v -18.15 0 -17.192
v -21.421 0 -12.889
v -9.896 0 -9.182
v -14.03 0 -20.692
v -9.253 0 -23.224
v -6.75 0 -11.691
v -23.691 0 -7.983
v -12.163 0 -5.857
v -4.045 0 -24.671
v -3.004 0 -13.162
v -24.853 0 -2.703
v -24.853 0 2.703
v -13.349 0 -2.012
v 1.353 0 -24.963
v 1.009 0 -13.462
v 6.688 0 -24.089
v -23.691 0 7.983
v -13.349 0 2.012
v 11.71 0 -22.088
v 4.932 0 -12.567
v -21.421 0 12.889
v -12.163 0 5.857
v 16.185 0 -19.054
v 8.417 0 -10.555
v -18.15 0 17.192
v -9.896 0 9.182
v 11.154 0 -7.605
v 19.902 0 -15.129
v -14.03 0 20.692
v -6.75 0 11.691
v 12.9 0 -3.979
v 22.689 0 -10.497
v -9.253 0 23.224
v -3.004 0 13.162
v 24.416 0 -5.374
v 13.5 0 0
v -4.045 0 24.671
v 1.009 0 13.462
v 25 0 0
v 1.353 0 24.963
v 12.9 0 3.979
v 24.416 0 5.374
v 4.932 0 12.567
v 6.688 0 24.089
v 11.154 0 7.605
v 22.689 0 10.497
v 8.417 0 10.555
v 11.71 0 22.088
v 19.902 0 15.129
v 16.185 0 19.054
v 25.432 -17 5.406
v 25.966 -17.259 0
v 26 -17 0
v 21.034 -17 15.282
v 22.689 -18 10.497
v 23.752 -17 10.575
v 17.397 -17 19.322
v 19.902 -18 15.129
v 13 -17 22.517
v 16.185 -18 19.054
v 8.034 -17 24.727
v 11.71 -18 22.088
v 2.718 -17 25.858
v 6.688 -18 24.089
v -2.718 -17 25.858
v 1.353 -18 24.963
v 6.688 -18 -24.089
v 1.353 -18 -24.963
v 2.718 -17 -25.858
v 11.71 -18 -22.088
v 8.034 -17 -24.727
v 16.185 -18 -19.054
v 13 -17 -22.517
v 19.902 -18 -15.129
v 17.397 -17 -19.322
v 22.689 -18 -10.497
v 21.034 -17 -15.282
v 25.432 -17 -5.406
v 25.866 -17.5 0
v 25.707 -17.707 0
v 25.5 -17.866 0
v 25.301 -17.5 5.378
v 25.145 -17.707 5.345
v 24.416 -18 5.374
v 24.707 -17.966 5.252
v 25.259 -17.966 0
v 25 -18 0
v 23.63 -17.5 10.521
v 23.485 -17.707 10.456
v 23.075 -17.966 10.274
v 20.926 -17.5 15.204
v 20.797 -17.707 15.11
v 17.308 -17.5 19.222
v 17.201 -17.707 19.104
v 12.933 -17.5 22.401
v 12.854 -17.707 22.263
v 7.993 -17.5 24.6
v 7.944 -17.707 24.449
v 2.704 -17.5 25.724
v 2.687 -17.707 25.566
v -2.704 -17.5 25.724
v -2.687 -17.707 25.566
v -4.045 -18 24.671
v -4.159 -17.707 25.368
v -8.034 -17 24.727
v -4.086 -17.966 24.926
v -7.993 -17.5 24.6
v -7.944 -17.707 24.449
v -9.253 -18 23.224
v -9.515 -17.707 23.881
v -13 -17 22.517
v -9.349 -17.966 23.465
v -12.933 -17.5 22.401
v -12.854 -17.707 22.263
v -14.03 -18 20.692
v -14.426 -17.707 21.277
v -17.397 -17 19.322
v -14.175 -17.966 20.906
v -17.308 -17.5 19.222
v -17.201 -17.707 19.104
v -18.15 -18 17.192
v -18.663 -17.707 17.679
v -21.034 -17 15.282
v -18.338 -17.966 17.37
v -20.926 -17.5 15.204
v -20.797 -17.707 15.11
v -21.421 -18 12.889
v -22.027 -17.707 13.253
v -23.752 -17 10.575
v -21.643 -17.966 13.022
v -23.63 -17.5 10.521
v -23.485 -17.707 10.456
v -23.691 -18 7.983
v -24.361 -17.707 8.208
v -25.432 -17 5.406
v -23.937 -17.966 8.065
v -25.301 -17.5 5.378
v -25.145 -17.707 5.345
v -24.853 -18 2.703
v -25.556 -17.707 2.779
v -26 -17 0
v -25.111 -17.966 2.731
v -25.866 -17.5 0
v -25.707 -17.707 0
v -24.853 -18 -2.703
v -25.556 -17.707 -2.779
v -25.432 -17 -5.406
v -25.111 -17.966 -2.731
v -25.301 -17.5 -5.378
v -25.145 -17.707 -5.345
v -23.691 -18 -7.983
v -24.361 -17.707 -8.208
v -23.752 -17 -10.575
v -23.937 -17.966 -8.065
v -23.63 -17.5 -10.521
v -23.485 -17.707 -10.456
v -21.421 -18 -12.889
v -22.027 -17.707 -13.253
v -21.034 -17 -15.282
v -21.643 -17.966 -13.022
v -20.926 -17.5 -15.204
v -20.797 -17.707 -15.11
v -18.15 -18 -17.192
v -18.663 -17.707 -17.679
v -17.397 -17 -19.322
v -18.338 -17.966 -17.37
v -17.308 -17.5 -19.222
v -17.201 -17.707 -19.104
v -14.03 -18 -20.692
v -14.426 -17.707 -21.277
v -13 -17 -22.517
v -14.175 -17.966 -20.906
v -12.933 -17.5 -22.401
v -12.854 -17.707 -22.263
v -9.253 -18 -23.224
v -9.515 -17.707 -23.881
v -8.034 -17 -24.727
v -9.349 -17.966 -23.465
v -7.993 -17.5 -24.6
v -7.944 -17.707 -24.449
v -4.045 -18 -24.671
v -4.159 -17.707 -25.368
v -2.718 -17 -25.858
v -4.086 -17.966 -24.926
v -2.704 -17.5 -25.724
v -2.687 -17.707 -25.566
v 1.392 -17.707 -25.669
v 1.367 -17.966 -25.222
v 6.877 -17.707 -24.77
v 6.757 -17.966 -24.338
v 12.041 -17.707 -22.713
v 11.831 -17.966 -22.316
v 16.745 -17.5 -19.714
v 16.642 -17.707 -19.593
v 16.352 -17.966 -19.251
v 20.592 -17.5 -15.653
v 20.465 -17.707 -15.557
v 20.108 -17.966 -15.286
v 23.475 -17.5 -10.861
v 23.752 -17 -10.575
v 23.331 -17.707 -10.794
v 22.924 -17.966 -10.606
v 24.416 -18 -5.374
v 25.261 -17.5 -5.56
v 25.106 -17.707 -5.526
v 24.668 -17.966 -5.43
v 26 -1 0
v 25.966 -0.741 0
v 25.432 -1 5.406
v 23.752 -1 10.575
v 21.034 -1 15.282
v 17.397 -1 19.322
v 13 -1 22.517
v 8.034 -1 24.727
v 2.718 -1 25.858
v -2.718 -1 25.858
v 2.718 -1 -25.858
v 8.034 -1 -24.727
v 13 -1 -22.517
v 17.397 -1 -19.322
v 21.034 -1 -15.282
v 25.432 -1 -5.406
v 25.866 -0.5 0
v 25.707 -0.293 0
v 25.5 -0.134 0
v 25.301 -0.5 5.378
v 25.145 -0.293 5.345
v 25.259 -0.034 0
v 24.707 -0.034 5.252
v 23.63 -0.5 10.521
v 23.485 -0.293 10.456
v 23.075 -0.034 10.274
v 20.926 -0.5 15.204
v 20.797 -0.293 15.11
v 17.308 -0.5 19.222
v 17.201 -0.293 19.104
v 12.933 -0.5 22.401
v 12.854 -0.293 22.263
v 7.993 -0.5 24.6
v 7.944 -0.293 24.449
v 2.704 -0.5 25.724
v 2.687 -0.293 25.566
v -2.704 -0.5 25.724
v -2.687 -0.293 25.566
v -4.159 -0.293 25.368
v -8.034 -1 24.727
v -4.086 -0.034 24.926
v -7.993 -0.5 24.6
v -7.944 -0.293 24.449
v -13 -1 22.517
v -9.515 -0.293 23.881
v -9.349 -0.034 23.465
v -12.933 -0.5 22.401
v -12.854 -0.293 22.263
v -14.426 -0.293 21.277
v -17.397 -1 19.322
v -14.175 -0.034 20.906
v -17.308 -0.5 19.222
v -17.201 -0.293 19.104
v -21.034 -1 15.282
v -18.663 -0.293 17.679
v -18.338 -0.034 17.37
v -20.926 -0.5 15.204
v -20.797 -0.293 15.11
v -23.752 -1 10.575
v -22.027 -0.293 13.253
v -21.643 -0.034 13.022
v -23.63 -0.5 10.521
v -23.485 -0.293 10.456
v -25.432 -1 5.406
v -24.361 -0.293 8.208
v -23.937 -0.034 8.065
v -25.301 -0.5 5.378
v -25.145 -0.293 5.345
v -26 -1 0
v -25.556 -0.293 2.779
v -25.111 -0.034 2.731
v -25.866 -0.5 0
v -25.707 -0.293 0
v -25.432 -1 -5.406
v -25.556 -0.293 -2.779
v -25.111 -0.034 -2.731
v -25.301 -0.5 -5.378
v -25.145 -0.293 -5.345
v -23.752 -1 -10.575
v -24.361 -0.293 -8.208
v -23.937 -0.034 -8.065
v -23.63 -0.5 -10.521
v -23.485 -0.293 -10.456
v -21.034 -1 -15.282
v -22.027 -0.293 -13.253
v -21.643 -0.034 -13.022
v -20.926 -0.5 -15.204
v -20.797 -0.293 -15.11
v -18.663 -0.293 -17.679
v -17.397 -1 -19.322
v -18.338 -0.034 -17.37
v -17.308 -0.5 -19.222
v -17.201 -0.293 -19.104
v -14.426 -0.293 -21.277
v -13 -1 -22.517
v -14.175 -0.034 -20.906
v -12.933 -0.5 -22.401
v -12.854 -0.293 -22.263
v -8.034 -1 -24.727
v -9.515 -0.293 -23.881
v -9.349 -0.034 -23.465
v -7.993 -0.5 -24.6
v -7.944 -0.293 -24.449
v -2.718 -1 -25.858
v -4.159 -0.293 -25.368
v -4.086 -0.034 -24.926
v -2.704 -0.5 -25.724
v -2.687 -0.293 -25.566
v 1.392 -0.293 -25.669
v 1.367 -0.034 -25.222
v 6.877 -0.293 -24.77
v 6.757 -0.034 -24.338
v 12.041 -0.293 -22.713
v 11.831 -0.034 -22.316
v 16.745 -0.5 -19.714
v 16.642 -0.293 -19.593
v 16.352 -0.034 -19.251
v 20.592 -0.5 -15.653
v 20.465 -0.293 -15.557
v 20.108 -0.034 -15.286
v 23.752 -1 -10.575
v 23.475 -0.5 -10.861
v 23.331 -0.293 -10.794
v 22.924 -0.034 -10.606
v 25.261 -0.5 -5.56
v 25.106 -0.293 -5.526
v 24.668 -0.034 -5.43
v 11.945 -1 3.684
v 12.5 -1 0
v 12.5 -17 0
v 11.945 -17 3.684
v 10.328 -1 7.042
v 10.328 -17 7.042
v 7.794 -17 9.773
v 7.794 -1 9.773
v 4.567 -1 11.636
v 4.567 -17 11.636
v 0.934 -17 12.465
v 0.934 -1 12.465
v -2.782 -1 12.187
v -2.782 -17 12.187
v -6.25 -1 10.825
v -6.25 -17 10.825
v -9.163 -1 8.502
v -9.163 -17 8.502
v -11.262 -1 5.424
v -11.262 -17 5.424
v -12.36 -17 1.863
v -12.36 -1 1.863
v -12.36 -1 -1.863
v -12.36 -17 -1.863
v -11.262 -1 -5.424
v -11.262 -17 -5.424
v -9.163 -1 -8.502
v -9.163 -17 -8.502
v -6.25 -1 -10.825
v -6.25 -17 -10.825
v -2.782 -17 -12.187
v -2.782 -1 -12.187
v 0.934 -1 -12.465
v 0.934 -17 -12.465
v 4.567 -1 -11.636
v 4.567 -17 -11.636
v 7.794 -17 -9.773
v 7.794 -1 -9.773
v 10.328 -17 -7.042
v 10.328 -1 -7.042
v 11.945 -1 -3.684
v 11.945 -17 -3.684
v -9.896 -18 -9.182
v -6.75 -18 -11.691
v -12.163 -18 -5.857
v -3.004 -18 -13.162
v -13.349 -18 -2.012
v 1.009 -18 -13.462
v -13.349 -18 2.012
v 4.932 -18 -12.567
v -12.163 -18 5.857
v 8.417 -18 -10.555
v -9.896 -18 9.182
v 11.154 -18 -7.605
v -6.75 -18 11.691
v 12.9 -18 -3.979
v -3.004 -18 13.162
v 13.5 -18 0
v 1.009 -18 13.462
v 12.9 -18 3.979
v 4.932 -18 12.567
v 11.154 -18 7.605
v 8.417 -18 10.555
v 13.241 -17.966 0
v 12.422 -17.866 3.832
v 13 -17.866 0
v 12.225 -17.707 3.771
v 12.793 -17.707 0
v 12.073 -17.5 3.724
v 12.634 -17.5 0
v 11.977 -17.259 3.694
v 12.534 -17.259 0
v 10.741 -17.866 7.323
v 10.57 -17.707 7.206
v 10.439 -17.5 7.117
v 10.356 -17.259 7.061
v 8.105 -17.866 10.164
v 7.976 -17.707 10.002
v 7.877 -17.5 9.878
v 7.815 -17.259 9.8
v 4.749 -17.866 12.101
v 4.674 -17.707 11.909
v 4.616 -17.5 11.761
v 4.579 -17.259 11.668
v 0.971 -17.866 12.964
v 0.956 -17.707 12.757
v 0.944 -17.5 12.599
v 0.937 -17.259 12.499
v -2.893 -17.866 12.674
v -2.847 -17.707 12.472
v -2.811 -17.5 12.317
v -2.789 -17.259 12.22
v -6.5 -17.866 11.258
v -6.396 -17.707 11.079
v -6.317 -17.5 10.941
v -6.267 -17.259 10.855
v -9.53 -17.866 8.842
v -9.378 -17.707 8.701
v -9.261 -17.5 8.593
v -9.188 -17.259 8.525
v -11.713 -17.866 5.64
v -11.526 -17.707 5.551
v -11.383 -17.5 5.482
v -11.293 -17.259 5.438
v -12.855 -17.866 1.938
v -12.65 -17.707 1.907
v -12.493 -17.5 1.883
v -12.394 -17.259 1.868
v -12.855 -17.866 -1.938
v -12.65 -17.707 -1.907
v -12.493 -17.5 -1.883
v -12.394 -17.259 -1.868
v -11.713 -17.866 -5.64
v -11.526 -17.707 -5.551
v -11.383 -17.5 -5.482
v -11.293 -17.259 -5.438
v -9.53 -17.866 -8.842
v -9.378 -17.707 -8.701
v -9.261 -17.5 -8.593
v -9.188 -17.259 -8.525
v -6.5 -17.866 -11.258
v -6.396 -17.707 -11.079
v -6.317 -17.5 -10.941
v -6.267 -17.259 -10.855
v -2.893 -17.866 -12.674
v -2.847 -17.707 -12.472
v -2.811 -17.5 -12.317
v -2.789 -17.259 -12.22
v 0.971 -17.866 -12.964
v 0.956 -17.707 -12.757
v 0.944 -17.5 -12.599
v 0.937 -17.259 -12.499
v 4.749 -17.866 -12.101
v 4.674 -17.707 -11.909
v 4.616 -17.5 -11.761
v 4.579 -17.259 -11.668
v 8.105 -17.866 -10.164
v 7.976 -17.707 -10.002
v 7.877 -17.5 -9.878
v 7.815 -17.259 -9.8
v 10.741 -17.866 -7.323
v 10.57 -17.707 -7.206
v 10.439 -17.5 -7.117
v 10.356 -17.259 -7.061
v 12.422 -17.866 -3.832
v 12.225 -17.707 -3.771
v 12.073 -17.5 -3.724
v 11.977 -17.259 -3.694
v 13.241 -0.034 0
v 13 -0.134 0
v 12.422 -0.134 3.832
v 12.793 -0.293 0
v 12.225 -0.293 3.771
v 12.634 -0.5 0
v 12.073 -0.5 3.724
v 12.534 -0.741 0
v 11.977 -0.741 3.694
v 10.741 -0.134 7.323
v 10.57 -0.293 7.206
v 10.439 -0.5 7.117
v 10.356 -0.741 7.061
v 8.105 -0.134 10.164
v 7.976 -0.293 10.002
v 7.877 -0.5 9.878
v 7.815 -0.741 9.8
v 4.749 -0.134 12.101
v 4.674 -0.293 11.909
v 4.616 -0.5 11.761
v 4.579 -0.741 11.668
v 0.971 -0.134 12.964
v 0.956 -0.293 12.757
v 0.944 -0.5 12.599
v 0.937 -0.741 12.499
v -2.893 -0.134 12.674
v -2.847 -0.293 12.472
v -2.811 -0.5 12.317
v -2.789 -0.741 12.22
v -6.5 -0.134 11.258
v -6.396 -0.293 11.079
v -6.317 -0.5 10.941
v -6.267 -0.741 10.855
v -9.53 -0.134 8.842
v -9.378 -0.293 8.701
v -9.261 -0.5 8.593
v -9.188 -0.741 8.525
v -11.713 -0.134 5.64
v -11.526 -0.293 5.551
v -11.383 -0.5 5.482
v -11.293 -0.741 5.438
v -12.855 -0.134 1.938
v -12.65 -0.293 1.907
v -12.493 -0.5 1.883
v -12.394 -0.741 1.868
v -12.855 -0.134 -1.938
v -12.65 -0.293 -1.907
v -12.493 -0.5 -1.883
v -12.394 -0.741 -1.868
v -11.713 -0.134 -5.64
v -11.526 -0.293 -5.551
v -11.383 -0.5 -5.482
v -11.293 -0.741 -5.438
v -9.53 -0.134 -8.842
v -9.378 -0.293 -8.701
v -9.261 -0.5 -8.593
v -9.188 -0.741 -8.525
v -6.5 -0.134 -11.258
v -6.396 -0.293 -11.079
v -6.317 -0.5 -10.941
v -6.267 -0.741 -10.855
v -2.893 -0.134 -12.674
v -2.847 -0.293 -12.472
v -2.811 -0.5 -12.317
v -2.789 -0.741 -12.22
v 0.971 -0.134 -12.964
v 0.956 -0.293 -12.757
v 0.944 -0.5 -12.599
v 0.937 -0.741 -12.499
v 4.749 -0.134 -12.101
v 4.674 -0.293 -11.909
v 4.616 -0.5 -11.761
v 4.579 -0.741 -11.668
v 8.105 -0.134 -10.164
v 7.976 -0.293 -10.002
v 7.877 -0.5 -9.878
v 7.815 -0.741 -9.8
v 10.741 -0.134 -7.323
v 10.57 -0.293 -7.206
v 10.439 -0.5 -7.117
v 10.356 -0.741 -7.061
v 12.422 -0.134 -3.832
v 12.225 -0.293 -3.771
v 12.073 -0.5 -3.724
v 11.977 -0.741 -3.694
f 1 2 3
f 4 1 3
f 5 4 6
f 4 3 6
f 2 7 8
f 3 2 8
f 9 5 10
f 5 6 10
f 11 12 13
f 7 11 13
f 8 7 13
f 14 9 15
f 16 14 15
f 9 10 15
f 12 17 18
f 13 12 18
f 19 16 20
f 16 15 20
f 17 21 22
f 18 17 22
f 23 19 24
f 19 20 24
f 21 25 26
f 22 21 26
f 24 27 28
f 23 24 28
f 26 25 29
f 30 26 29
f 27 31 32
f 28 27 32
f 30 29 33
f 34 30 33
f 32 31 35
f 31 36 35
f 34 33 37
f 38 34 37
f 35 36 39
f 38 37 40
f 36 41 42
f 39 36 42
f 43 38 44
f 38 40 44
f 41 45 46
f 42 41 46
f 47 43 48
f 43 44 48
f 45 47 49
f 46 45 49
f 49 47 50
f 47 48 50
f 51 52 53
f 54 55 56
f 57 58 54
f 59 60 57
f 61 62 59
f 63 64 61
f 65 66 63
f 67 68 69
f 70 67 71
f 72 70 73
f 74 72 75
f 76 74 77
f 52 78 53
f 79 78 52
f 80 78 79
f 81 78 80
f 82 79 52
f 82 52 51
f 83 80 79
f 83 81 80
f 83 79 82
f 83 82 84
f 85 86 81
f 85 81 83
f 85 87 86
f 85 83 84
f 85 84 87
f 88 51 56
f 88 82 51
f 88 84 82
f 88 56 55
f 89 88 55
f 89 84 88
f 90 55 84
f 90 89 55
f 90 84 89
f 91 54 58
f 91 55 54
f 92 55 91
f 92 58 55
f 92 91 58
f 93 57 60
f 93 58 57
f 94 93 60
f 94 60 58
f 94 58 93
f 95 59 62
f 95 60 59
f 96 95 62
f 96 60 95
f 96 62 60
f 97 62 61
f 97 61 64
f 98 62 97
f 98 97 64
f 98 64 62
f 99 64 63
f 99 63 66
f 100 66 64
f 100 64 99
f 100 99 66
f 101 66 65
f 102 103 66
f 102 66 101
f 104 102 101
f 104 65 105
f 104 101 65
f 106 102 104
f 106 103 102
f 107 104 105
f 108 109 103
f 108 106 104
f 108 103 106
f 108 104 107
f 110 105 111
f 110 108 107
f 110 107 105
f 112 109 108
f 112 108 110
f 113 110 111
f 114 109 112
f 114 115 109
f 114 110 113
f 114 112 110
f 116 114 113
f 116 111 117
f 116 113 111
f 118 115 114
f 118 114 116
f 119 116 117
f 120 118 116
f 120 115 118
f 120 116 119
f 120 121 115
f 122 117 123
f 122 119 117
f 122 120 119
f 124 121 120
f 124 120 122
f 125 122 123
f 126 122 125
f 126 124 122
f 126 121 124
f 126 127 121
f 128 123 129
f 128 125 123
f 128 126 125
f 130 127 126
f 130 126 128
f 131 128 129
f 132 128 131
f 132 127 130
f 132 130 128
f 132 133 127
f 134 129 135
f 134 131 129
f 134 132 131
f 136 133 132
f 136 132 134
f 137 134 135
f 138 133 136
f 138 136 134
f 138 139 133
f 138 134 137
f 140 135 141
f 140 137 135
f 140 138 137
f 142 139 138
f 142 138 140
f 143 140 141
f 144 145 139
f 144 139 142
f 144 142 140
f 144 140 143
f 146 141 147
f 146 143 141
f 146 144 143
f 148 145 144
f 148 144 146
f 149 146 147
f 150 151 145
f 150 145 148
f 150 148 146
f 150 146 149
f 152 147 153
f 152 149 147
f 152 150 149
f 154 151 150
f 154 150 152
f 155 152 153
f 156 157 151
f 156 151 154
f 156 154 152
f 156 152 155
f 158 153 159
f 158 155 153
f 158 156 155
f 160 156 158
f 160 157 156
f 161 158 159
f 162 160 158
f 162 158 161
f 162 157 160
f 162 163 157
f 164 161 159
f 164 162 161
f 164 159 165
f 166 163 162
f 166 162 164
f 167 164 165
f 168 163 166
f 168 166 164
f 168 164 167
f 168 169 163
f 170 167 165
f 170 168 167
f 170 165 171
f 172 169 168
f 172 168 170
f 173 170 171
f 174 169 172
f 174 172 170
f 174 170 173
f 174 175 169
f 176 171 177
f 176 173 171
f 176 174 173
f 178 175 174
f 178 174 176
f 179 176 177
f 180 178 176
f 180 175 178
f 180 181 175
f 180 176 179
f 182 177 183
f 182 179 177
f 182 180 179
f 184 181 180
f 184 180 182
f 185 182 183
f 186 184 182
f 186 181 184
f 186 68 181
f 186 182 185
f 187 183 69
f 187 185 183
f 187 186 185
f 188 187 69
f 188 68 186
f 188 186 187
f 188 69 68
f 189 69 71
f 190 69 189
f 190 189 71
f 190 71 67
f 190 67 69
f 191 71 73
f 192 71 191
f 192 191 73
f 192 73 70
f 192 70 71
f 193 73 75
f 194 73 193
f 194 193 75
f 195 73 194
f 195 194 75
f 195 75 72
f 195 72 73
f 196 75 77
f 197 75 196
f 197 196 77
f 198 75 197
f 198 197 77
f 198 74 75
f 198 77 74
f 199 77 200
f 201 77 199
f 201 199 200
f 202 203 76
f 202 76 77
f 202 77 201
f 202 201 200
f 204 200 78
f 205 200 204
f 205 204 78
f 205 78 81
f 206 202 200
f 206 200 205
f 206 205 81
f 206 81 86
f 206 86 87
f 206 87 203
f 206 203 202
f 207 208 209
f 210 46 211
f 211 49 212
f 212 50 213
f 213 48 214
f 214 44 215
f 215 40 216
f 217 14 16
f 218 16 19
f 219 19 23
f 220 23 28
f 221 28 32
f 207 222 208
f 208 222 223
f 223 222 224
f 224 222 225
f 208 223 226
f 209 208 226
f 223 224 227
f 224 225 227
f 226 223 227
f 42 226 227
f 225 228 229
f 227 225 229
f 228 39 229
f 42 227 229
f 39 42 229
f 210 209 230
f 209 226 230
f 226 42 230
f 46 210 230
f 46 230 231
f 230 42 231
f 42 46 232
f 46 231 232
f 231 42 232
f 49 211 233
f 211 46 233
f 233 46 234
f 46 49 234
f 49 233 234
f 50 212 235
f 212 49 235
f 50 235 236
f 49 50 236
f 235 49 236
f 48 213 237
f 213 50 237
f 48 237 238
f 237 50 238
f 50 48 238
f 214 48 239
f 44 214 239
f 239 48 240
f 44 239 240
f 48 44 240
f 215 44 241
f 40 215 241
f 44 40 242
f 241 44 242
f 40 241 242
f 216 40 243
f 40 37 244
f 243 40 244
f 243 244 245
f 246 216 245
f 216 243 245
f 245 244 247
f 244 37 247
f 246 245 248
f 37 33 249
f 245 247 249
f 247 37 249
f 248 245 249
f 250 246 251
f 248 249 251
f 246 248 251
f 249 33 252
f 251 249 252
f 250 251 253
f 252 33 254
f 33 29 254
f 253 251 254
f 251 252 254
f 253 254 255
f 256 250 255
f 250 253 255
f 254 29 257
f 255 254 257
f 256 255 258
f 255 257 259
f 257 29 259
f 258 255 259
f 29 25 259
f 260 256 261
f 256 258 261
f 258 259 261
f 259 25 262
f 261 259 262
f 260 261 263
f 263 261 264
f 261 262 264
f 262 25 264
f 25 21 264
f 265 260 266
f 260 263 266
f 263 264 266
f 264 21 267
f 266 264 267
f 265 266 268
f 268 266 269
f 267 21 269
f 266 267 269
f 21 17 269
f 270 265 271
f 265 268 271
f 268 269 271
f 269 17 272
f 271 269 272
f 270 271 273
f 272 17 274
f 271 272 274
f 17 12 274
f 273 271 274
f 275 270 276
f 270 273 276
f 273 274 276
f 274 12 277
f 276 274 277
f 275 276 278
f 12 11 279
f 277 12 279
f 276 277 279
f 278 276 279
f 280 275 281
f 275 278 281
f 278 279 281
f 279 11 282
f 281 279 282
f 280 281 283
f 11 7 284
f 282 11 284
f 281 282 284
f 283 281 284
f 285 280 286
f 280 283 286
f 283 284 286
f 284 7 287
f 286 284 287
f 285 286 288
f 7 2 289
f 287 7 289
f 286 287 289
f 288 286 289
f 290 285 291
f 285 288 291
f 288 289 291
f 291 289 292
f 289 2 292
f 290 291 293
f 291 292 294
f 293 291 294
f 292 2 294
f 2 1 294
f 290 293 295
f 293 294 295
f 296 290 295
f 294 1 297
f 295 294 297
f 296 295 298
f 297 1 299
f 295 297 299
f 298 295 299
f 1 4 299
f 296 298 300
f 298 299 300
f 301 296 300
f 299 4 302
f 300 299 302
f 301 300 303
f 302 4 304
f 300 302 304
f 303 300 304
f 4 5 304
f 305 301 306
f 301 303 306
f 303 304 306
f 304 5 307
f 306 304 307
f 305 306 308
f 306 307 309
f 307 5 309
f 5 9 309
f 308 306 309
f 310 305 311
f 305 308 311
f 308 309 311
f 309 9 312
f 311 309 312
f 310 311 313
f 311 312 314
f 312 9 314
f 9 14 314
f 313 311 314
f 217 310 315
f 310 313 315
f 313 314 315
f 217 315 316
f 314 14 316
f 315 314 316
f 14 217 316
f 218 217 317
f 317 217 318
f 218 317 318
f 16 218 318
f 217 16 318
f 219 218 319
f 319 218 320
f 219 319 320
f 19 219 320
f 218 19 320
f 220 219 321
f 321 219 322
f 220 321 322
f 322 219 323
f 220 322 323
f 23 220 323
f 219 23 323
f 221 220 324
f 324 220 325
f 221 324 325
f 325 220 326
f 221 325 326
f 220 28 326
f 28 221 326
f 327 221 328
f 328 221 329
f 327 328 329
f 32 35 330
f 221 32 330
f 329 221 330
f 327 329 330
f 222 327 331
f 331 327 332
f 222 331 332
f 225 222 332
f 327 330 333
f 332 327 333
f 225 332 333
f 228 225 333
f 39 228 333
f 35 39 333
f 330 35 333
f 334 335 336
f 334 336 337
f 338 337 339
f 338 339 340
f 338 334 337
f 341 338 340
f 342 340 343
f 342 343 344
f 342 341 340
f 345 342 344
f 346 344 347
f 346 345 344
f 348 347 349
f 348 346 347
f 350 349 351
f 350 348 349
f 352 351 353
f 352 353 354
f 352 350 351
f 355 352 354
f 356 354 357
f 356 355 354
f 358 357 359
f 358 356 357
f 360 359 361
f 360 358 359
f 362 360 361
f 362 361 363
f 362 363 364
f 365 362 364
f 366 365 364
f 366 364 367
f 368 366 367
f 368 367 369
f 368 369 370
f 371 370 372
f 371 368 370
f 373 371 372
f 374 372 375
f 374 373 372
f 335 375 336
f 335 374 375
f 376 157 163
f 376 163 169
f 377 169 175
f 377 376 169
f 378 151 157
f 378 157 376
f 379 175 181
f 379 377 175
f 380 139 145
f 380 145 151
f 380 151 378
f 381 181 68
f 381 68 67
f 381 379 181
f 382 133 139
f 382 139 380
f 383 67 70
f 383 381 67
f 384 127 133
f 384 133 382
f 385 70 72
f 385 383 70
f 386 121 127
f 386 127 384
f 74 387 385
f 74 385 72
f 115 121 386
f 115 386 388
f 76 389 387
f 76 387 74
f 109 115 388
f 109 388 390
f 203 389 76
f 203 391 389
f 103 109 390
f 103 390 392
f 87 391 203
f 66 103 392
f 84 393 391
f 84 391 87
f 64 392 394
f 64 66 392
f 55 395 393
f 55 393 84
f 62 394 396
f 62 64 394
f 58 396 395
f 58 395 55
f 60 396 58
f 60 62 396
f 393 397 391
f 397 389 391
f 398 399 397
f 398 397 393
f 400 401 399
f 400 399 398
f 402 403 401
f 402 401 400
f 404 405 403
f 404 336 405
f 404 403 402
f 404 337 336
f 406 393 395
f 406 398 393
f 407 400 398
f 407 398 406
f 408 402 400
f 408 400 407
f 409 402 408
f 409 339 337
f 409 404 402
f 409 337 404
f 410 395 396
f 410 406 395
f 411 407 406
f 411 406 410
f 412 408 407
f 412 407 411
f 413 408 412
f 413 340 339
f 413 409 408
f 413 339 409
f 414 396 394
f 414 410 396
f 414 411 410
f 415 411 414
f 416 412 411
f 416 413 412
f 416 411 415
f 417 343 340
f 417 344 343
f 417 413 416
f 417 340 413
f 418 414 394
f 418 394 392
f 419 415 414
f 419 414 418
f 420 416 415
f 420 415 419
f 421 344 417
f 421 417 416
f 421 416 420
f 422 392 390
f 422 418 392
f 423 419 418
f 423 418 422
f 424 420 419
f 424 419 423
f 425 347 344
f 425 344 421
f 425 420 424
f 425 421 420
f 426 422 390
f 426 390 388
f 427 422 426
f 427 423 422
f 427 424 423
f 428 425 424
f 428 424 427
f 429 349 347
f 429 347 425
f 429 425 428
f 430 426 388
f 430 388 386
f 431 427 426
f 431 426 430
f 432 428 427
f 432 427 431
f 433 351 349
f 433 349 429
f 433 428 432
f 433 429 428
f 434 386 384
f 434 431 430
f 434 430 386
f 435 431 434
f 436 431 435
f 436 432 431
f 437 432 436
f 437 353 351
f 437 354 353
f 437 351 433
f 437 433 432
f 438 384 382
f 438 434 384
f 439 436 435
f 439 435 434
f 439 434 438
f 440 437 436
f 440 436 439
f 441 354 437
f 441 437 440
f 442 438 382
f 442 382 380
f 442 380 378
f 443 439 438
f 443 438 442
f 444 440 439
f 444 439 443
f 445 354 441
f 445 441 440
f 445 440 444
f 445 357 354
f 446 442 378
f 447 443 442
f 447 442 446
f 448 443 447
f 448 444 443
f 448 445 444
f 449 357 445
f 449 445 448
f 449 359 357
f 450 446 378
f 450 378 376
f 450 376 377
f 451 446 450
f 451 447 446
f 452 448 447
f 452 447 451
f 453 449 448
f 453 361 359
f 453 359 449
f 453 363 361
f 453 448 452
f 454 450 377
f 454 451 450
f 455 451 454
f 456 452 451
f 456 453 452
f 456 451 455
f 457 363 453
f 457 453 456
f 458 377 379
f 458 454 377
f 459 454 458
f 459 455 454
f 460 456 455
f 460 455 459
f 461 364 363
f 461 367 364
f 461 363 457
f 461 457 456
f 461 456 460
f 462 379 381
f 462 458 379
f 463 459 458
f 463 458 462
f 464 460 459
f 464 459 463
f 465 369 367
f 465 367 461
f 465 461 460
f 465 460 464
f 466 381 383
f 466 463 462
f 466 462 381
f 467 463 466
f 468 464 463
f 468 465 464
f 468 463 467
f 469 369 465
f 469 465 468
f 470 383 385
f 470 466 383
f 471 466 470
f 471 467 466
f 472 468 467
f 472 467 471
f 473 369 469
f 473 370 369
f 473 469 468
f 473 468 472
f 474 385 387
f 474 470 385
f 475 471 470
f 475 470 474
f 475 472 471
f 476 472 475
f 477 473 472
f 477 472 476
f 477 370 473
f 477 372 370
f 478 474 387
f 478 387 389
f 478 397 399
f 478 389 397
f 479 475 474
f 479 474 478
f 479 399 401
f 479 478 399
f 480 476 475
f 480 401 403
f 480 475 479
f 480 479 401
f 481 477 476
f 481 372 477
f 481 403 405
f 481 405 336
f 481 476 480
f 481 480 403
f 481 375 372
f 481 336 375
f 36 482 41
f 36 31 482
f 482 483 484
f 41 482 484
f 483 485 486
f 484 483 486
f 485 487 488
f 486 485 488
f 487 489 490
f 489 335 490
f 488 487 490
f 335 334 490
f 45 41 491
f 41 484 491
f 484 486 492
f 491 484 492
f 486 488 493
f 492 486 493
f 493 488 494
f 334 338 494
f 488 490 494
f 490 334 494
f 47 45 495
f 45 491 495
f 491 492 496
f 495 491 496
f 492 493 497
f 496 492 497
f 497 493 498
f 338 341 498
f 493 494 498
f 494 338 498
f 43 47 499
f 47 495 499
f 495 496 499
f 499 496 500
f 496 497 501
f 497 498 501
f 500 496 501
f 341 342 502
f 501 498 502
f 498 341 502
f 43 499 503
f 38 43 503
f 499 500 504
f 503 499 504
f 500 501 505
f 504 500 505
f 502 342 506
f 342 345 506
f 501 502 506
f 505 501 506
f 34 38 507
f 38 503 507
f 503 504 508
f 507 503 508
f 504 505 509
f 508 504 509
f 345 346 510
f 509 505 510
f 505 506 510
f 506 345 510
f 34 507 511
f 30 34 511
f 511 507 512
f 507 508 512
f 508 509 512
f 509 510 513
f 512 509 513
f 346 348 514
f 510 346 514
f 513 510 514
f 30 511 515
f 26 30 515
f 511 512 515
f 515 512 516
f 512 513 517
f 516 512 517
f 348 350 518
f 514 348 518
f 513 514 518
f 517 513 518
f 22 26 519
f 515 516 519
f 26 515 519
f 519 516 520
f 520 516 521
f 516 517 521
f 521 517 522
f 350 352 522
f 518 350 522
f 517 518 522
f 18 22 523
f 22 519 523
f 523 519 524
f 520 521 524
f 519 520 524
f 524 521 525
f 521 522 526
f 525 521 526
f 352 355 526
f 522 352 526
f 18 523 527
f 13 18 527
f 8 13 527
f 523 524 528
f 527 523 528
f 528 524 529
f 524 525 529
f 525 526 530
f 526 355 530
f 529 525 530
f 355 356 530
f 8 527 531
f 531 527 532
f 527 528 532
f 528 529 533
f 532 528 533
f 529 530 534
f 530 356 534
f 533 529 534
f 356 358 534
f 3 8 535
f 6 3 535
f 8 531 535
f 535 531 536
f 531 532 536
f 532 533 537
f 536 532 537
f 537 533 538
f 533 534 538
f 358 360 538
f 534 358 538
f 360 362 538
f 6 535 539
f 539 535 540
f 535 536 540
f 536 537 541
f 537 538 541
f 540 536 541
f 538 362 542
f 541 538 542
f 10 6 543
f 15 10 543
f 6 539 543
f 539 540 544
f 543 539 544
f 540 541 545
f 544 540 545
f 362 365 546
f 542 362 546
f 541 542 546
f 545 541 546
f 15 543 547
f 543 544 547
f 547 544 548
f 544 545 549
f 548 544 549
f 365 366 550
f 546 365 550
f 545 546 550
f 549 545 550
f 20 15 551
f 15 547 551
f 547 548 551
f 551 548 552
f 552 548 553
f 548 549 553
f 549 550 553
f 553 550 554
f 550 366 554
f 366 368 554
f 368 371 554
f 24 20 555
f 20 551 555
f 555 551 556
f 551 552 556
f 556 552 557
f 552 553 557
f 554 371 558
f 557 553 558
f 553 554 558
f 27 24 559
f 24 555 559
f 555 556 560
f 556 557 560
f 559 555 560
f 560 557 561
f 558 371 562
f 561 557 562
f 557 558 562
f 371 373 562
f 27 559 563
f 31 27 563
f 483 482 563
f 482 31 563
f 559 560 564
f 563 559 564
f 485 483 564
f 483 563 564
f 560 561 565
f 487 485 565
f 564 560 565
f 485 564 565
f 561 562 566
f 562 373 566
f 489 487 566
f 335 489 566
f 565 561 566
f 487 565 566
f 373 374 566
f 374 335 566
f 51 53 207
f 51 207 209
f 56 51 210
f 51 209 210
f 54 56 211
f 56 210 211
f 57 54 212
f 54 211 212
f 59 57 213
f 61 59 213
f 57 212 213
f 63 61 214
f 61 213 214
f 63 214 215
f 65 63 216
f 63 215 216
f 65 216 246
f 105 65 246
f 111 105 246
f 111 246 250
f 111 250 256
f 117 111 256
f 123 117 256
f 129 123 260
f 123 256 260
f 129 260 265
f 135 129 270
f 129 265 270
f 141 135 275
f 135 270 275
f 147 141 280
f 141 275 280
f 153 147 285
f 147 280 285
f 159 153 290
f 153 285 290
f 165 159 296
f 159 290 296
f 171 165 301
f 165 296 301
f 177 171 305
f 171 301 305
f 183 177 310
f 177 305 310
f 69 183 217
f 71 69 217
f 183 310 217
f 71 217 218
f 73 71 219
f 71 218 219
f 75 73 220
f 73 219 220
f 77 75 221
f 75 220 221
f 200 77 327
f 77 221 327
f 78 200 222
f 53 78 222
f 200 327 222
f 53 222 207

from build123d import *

# Parameters (mm, degrees)
F0_R     = 26
F0_R_2   = 12.5
F1_DEPTH = 18
F2_R     = 1
F3_R     = 1


with BuildPart() as f1:
    # F0 (on Front) → F1 (new body)
    with BuildSketch(Plane.XZ):
        Circle(F0_R)
        Circle(F0_R_2, mode=Mode.SUBTRACT)
    extrude(amount=F1_DEPTH)

    # F2
    f2_edges = [f1.edges().sort_by_distance(p)[0] for p in [
        (-26, -18, 0),
        (-26, 0, 0),
    ]]
    fillet(f2_edges, radius=F2_R)

    # F3
    f3_edges = [f1.edges().sort_by_distance(p)[0] for p in [
        (-12.5, -18, 0),
        (-12.5, 0, 0),
    ]]
    fillet(f3_edges, radius=F3_R)


solid = f1.part
